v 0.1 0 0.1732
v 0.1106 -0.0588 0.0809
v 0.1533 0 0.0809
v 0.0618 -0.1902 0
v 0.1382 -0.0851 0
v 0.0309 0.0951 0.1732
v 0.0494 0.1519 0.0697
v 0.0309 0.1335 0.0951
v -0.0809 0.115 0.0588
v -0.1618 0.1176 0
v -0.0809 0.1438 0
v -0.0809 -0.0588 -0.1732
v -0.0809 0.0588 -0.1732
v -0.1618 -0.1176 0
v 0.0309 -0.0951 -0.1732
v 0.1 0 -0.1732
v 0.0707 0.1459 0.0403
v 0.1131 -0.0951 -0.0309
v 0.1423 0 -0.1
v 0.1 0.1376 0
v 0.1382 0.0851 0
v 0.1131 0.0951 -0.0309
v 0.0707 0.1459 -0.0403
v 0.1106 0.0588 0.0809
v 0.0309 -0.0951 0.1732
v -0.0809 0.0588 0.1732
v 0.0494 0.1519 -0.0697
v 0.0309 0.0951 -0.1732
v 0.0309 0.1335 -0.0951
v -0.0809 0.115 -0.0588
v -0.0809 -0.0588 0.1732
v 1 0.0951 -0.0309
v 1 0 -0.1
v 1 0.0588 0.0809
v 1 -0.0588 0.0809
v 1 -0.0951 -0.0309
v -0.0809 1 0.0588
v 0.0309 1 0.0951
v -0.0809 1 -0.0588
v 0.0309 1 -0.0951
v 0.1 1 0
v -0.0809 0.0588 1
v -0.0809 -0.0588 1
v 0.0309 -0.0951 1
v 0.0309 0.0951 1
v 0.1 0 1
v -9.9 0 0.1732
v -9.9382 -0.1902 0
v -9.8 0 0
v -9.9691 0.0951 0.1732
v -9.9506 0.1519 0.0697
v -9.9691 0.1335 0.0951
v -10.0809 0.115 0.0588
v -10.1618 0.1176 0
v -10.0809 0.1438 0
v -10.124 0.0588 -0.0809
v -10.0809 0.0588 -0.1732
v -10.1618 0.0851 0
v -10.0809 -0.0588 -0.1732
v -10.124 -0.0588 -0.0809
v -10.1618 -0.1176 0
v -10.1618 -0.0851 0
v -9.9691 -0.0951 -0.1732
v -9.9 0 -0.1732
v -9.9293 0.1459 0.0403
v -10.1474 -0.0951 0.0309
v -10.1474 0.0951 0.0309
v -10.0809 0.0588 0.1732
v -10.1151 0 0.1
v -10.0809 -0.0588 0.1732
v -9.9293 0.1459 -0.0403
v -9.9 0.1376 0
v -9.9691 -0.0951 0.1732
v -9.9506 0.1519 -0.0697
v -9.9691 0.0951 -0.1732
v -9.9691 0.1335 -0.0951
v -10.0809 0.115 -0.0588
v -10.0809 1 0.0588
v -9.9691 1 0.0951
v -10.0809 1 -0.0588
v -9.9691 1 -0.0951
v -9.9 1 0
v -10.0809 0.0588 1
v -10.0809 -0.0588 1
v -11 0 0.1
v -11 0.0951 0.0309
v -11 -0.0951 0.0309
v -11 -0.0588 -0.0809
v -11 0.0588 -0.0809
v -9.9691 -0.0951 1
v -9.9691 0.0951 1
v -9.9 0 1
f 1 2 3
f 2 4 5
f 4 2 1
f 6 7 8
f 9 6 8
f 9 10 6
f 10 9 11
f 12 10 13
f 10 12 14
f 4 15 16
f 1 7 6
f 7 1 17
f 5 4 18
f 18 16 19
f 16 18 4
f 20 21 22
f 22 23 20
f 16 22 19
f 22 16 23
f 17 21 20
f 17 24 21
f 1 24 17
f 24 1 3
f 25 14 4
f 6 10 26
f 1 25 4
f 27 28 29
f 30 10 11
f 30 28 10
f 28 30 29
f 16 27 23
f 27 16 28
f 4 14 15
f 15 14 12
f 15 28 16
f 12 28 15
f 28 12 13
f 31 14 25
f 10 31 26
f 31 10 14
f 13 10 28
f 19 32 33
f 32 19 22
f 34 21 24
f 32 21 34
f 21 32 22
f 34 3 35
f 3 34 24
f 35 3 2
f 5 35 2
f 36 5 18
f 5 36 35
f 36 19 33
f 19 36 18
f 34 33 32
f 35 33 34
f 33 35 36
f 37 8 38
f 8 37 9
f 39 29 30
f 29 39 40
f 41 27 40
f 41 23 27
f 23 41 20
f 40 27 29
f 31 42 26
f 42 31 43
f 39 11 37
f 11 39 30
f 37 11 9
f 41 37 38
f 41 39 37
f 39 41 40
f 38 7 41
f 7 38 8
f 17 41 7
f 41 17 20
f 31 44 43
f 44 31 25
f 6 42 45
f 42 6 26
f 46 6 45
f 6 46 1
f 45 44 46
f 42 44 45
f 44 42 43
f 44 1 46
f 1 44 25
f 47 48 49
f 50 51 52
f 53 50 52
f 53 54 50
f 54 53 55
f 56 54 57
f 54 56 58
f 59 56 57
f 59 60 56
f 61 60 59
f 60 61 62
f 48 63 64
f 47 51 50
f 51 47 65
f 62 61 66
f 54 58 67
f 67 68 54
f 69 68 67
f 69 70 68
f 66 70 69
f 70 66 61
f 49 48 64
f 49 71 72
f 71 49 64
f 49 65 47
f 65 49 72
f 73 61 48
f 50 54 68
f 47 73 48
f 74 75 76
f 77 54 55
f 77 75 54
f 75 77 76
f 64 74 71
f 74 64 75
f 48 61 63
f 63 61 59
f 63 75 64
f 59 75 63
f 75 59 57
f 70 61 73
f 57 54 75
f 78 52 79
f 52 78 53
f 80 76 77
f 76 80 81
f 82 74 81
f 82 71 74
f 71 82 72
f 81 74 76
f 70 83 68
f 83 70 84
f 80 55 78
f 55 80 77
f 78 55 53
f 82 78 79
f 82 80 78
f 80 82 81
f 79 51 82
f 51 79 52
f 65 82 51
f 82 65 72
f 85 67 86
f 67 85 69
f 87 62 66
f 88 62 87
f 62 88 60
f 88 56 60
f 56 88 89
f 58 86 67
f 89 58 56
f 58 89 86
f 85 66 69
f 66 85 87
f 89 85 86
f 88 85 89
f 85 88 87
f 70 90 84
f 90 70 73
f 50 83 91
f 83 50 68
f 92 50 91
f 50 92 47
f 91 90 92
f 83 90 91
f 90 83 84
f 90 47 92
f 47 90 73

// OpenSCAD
// file: local.scad
/*
Copyright (c) 2013 Johannes Reinhardt <jreinhardt@ist-dein-freund.de>

Permission is hereby granted, free of charge, to any person obtaining a copy
of this software and associated documentation files (the "Software"), to deal
in the Software without restriction, including without limitation the rights
to use, copy, modify, merge, publish, distribute, sublicense, and/or sell
copies of the Software, and to permit persons to whom the Software is
furnished to do so, subject to the following conditions:

The above copyright notice and this permission notice shall be included in
all copies or substantial portions of the Software.

THE SOFTWARE IS PROVIDED "AS IS", WITHOUT WARRANTY OF ANY KIND, EXPRESS OR
IMPLIED, INCLUDING BUT NOT LIMITED TO THE WARRANTIES OF MERCHANTABILITY,
FITNESS FOR A PARTICULAR PURPOSE AND NONINFRINGEMENT. IN NO EVENT SHALL THE
AUTHORS OR COPYRIGHT HOLDERS BE LIABLE FOR ANY CLAIM, DAMAGES OR OTHER
LIABILITY, WHETHER IN AN ACTION OF CONTRACT, TORT OR OTHERWISE, ARISING FROM,
OUT OF OR IN CONNECTION WITH THE SOFTWARE OR THE USE OR OTHER DEALINGS IN
THE SOFTWARE.
*/

/*
local.scad local coordinate systems for OpenSCAD

for more information, see https://github.com/jreinhardt/local-scad
*/

//a few utility functions
function norm(a) = sqrt(a*a);
function unit_vector(v) = v/norm(v);
function clamp(v,lower_bound,upper_bound) = min(max(v,lower_bound),upper_bound);
function cross_product(a,b) = [
	a[1]*b[2]-a[2]*b[1],
	a[2]*b[0]-a[0]*b[2],
	a[0]*b[1]-a[1]*b[0]
];

//works for both numbers and vectors
function almost_equal(number, ref, tol) = sqrt((number-ref)*(number-ref)) < tol;

function _rotation_angle(a,b) = (a*b > 0) ? 
	asin(clamp(norm(cross_product(b,a))/norm(a)/norm(b),-1,1)) :
	180 - asin(clamp(norm(cross_product(b,a))/norm(a)/norm(b),-1,1));

//The (non-unit) rotation axis and angle around which a has to be rotated to be colinear to b
function calculate_rotation_axis(a,b) =
	//if the two vectors are not colinear find a rotation axis using the cross product
	(norm(cross_product(b,a)) != 0) ? [unit_vector(cross_product(b,a)),_rotation_angle(a,b)] :
	//if they are colinear and do not lie in the yz plane, choose the rotation axis from the yz plane
	(a*[1,0,0] < 0) ? [unit_vector([0,-a[1],+a[0]]),acos(clamp(a*b/norm(a)/norm(b),-1,1))] :
	(a*[1,0,0] > 0) ? [unit_vector([0,+a[1],-a[0]]),acos(clamp(a*b/norm(a)/norm(b),-1,1))] :
	//otherwise use the x axis
	[[1,0,0],acos(clamp(a*b/norm(a)/norm(b),-1,1))];

function calculate_axes(x,y) = [unit_vector(x),unit_vector(y), unit_vector(cross_product(x,y))];

function new_cs(origin=[0,0,0],axes=[[1,0,0],[0,1,0],[0,0,1]]) = (len(axes) == 2) ?
	[origin,calculate_axes(axes[0],axes[1])] :
	is_orthonormal([origin,axes]) ?
		[origin,axes] :
		"Error: Axes are not orthonormal";

function is_orthonormal(cs,tol=1e-3) =
	(almost_equal(norm(cs[1][0]),1,tol)) &&
	(almost_equal(norm(cs[1][1]),1,tol)) &&
	(almost_equal(norm(cs[1][2]),1,tol)) &&
	(almost_equal(cross_product(cs[1][0],cs[1][1]),cs[1][2],tol)) &&
	(almost_equal(cross_product(cs[1][1],cs[1][2]),cs[1][0],tol)) &&
	(almost_equal(cross_product(cs[1][2],cs[1][0]),cs[1][1],tol));

function unit_matrix3() = [
[1,0,0],
[0,1,0],
[0,0,1]];

function tensor_product_matrix3(u,v) = [
[u[0]*v[0], u[0]*v[1], u[0]*v[2]],
[u[1]*v[0], u[1]*v[1], u[1]*v[2]],
[u[2]*v[0], u[2]*v[1], u[2]*v[2]]];

function cross_product_matrix3(v) = [
[   0 , -v[2], +v[1]],
[+v[2],    0 , -v[0]],
[-v[1],  v[0],    0 ]];

function rotation_matrix3(n,angle) =
	cos(angle)*unit_matrix3() +
	sin(angle)*cross_product_matrix3(n) +
	(1-cos(angle))*tensor_product_matrix3(n,n);

//the modules are used directly by the user
module show_cs(cs){
	origin = cs[0];
	axes = cs[1];
	x_rot = calculate_rotation_axis(axes[0],[0,0,1]);
	y_rot = calculate_rotation_axis(axes[1],[0,0,1]);
	z_rot = calculate_rotation_axis(axes[2],[0,0,1]);
	translate(origin){
		color("Gray") sphere(0.2);
		rotate(x_rot[1],x_rot[0]) color("Red") cylinder(r=0.1,h=norm(axes[0]));
		rotate(y_rot[1],y_rot[0]) color("Green") cylinder(r=0.1,h=norm(axes[1]));
		rotate(z_rot[1],z_rot[0]) color("Blue") cylinder(r=0.1,h=norm(axes[2]));
	}
}

module translate_local(cs,v=[0,0,0]){
	origin = cs[0];
	axes = cs[1];
	x_rot = calculate_rotation_axis(axes[0],[1,0,0]);
	y_rot = calculate_rotation_axis(axes[1],
		rotation_matrix3(x_rot[0],x_rot[1])*[0,1,0]);
	translate(origin+v*axes){
		//align y axes
		rotate(y_rot[1],y_rot[0]){
			//align x axes
			rotate(x_rot[1],x_rot[0]){
				children(0);
			}
		}
	}
}

module in_cs(cs){
	origin = cs[0];
	axes = cs[1];
	x_rot = calculate_rotation_axis(axes[0],[1,0,0]);
	y_rot = calculate_rotation_axis(axes[1],
		rotation_matrix3(x_rot[0],x_rot[1])*[0,1,0]);
	translate(origin){
		//align y axes
		rotate(y_rot[1],y_rot[0]){
			//align x axes
			rotate(x_rot[1],x_rot[0]){
				children(0);
			}
		}
	}
}

module align(cs, cs_dst, displacement=[0,0,0]){
	x_rot = calculate_rotation_axis(cs[1][0],cs_dst[1][0]);
	y_rot = _rotation_angle(cs[1][1],
		rotation_matrix3(x_rot[0],x_rot[1])*cs_dst[1][1]);
	translate(cs_dst[0]+displacement*cs_dst[1])
		//align x axes
		rotate(-x_rot[1],x_rot[0])
				//align y axes
				rotate(-y_rot,cs[1][0])
				translate(-cs[0])
					children(0);
}
// main file
use <local.scad>

//create and show new coordinate systems
global = new_cs();
shifted = new_cs(origin=[10,2,4]);
rotated = new_cs(origin=[-10,0,0],axes=[[0,1,0],[-1,0,0],[0,0,1]]);
rotated2 = new_cs(origin=[0,-10,0],axes=[[1,1,1],[0,1,-1]]);
rotated3 = new_cs(origin=[0,-10,0],axes=[[1,1,1],[1,-1,0]]);


show_cs(global);
//show_cs(shifted);
show_cs(rotated);
//show_cs(rotated2);
